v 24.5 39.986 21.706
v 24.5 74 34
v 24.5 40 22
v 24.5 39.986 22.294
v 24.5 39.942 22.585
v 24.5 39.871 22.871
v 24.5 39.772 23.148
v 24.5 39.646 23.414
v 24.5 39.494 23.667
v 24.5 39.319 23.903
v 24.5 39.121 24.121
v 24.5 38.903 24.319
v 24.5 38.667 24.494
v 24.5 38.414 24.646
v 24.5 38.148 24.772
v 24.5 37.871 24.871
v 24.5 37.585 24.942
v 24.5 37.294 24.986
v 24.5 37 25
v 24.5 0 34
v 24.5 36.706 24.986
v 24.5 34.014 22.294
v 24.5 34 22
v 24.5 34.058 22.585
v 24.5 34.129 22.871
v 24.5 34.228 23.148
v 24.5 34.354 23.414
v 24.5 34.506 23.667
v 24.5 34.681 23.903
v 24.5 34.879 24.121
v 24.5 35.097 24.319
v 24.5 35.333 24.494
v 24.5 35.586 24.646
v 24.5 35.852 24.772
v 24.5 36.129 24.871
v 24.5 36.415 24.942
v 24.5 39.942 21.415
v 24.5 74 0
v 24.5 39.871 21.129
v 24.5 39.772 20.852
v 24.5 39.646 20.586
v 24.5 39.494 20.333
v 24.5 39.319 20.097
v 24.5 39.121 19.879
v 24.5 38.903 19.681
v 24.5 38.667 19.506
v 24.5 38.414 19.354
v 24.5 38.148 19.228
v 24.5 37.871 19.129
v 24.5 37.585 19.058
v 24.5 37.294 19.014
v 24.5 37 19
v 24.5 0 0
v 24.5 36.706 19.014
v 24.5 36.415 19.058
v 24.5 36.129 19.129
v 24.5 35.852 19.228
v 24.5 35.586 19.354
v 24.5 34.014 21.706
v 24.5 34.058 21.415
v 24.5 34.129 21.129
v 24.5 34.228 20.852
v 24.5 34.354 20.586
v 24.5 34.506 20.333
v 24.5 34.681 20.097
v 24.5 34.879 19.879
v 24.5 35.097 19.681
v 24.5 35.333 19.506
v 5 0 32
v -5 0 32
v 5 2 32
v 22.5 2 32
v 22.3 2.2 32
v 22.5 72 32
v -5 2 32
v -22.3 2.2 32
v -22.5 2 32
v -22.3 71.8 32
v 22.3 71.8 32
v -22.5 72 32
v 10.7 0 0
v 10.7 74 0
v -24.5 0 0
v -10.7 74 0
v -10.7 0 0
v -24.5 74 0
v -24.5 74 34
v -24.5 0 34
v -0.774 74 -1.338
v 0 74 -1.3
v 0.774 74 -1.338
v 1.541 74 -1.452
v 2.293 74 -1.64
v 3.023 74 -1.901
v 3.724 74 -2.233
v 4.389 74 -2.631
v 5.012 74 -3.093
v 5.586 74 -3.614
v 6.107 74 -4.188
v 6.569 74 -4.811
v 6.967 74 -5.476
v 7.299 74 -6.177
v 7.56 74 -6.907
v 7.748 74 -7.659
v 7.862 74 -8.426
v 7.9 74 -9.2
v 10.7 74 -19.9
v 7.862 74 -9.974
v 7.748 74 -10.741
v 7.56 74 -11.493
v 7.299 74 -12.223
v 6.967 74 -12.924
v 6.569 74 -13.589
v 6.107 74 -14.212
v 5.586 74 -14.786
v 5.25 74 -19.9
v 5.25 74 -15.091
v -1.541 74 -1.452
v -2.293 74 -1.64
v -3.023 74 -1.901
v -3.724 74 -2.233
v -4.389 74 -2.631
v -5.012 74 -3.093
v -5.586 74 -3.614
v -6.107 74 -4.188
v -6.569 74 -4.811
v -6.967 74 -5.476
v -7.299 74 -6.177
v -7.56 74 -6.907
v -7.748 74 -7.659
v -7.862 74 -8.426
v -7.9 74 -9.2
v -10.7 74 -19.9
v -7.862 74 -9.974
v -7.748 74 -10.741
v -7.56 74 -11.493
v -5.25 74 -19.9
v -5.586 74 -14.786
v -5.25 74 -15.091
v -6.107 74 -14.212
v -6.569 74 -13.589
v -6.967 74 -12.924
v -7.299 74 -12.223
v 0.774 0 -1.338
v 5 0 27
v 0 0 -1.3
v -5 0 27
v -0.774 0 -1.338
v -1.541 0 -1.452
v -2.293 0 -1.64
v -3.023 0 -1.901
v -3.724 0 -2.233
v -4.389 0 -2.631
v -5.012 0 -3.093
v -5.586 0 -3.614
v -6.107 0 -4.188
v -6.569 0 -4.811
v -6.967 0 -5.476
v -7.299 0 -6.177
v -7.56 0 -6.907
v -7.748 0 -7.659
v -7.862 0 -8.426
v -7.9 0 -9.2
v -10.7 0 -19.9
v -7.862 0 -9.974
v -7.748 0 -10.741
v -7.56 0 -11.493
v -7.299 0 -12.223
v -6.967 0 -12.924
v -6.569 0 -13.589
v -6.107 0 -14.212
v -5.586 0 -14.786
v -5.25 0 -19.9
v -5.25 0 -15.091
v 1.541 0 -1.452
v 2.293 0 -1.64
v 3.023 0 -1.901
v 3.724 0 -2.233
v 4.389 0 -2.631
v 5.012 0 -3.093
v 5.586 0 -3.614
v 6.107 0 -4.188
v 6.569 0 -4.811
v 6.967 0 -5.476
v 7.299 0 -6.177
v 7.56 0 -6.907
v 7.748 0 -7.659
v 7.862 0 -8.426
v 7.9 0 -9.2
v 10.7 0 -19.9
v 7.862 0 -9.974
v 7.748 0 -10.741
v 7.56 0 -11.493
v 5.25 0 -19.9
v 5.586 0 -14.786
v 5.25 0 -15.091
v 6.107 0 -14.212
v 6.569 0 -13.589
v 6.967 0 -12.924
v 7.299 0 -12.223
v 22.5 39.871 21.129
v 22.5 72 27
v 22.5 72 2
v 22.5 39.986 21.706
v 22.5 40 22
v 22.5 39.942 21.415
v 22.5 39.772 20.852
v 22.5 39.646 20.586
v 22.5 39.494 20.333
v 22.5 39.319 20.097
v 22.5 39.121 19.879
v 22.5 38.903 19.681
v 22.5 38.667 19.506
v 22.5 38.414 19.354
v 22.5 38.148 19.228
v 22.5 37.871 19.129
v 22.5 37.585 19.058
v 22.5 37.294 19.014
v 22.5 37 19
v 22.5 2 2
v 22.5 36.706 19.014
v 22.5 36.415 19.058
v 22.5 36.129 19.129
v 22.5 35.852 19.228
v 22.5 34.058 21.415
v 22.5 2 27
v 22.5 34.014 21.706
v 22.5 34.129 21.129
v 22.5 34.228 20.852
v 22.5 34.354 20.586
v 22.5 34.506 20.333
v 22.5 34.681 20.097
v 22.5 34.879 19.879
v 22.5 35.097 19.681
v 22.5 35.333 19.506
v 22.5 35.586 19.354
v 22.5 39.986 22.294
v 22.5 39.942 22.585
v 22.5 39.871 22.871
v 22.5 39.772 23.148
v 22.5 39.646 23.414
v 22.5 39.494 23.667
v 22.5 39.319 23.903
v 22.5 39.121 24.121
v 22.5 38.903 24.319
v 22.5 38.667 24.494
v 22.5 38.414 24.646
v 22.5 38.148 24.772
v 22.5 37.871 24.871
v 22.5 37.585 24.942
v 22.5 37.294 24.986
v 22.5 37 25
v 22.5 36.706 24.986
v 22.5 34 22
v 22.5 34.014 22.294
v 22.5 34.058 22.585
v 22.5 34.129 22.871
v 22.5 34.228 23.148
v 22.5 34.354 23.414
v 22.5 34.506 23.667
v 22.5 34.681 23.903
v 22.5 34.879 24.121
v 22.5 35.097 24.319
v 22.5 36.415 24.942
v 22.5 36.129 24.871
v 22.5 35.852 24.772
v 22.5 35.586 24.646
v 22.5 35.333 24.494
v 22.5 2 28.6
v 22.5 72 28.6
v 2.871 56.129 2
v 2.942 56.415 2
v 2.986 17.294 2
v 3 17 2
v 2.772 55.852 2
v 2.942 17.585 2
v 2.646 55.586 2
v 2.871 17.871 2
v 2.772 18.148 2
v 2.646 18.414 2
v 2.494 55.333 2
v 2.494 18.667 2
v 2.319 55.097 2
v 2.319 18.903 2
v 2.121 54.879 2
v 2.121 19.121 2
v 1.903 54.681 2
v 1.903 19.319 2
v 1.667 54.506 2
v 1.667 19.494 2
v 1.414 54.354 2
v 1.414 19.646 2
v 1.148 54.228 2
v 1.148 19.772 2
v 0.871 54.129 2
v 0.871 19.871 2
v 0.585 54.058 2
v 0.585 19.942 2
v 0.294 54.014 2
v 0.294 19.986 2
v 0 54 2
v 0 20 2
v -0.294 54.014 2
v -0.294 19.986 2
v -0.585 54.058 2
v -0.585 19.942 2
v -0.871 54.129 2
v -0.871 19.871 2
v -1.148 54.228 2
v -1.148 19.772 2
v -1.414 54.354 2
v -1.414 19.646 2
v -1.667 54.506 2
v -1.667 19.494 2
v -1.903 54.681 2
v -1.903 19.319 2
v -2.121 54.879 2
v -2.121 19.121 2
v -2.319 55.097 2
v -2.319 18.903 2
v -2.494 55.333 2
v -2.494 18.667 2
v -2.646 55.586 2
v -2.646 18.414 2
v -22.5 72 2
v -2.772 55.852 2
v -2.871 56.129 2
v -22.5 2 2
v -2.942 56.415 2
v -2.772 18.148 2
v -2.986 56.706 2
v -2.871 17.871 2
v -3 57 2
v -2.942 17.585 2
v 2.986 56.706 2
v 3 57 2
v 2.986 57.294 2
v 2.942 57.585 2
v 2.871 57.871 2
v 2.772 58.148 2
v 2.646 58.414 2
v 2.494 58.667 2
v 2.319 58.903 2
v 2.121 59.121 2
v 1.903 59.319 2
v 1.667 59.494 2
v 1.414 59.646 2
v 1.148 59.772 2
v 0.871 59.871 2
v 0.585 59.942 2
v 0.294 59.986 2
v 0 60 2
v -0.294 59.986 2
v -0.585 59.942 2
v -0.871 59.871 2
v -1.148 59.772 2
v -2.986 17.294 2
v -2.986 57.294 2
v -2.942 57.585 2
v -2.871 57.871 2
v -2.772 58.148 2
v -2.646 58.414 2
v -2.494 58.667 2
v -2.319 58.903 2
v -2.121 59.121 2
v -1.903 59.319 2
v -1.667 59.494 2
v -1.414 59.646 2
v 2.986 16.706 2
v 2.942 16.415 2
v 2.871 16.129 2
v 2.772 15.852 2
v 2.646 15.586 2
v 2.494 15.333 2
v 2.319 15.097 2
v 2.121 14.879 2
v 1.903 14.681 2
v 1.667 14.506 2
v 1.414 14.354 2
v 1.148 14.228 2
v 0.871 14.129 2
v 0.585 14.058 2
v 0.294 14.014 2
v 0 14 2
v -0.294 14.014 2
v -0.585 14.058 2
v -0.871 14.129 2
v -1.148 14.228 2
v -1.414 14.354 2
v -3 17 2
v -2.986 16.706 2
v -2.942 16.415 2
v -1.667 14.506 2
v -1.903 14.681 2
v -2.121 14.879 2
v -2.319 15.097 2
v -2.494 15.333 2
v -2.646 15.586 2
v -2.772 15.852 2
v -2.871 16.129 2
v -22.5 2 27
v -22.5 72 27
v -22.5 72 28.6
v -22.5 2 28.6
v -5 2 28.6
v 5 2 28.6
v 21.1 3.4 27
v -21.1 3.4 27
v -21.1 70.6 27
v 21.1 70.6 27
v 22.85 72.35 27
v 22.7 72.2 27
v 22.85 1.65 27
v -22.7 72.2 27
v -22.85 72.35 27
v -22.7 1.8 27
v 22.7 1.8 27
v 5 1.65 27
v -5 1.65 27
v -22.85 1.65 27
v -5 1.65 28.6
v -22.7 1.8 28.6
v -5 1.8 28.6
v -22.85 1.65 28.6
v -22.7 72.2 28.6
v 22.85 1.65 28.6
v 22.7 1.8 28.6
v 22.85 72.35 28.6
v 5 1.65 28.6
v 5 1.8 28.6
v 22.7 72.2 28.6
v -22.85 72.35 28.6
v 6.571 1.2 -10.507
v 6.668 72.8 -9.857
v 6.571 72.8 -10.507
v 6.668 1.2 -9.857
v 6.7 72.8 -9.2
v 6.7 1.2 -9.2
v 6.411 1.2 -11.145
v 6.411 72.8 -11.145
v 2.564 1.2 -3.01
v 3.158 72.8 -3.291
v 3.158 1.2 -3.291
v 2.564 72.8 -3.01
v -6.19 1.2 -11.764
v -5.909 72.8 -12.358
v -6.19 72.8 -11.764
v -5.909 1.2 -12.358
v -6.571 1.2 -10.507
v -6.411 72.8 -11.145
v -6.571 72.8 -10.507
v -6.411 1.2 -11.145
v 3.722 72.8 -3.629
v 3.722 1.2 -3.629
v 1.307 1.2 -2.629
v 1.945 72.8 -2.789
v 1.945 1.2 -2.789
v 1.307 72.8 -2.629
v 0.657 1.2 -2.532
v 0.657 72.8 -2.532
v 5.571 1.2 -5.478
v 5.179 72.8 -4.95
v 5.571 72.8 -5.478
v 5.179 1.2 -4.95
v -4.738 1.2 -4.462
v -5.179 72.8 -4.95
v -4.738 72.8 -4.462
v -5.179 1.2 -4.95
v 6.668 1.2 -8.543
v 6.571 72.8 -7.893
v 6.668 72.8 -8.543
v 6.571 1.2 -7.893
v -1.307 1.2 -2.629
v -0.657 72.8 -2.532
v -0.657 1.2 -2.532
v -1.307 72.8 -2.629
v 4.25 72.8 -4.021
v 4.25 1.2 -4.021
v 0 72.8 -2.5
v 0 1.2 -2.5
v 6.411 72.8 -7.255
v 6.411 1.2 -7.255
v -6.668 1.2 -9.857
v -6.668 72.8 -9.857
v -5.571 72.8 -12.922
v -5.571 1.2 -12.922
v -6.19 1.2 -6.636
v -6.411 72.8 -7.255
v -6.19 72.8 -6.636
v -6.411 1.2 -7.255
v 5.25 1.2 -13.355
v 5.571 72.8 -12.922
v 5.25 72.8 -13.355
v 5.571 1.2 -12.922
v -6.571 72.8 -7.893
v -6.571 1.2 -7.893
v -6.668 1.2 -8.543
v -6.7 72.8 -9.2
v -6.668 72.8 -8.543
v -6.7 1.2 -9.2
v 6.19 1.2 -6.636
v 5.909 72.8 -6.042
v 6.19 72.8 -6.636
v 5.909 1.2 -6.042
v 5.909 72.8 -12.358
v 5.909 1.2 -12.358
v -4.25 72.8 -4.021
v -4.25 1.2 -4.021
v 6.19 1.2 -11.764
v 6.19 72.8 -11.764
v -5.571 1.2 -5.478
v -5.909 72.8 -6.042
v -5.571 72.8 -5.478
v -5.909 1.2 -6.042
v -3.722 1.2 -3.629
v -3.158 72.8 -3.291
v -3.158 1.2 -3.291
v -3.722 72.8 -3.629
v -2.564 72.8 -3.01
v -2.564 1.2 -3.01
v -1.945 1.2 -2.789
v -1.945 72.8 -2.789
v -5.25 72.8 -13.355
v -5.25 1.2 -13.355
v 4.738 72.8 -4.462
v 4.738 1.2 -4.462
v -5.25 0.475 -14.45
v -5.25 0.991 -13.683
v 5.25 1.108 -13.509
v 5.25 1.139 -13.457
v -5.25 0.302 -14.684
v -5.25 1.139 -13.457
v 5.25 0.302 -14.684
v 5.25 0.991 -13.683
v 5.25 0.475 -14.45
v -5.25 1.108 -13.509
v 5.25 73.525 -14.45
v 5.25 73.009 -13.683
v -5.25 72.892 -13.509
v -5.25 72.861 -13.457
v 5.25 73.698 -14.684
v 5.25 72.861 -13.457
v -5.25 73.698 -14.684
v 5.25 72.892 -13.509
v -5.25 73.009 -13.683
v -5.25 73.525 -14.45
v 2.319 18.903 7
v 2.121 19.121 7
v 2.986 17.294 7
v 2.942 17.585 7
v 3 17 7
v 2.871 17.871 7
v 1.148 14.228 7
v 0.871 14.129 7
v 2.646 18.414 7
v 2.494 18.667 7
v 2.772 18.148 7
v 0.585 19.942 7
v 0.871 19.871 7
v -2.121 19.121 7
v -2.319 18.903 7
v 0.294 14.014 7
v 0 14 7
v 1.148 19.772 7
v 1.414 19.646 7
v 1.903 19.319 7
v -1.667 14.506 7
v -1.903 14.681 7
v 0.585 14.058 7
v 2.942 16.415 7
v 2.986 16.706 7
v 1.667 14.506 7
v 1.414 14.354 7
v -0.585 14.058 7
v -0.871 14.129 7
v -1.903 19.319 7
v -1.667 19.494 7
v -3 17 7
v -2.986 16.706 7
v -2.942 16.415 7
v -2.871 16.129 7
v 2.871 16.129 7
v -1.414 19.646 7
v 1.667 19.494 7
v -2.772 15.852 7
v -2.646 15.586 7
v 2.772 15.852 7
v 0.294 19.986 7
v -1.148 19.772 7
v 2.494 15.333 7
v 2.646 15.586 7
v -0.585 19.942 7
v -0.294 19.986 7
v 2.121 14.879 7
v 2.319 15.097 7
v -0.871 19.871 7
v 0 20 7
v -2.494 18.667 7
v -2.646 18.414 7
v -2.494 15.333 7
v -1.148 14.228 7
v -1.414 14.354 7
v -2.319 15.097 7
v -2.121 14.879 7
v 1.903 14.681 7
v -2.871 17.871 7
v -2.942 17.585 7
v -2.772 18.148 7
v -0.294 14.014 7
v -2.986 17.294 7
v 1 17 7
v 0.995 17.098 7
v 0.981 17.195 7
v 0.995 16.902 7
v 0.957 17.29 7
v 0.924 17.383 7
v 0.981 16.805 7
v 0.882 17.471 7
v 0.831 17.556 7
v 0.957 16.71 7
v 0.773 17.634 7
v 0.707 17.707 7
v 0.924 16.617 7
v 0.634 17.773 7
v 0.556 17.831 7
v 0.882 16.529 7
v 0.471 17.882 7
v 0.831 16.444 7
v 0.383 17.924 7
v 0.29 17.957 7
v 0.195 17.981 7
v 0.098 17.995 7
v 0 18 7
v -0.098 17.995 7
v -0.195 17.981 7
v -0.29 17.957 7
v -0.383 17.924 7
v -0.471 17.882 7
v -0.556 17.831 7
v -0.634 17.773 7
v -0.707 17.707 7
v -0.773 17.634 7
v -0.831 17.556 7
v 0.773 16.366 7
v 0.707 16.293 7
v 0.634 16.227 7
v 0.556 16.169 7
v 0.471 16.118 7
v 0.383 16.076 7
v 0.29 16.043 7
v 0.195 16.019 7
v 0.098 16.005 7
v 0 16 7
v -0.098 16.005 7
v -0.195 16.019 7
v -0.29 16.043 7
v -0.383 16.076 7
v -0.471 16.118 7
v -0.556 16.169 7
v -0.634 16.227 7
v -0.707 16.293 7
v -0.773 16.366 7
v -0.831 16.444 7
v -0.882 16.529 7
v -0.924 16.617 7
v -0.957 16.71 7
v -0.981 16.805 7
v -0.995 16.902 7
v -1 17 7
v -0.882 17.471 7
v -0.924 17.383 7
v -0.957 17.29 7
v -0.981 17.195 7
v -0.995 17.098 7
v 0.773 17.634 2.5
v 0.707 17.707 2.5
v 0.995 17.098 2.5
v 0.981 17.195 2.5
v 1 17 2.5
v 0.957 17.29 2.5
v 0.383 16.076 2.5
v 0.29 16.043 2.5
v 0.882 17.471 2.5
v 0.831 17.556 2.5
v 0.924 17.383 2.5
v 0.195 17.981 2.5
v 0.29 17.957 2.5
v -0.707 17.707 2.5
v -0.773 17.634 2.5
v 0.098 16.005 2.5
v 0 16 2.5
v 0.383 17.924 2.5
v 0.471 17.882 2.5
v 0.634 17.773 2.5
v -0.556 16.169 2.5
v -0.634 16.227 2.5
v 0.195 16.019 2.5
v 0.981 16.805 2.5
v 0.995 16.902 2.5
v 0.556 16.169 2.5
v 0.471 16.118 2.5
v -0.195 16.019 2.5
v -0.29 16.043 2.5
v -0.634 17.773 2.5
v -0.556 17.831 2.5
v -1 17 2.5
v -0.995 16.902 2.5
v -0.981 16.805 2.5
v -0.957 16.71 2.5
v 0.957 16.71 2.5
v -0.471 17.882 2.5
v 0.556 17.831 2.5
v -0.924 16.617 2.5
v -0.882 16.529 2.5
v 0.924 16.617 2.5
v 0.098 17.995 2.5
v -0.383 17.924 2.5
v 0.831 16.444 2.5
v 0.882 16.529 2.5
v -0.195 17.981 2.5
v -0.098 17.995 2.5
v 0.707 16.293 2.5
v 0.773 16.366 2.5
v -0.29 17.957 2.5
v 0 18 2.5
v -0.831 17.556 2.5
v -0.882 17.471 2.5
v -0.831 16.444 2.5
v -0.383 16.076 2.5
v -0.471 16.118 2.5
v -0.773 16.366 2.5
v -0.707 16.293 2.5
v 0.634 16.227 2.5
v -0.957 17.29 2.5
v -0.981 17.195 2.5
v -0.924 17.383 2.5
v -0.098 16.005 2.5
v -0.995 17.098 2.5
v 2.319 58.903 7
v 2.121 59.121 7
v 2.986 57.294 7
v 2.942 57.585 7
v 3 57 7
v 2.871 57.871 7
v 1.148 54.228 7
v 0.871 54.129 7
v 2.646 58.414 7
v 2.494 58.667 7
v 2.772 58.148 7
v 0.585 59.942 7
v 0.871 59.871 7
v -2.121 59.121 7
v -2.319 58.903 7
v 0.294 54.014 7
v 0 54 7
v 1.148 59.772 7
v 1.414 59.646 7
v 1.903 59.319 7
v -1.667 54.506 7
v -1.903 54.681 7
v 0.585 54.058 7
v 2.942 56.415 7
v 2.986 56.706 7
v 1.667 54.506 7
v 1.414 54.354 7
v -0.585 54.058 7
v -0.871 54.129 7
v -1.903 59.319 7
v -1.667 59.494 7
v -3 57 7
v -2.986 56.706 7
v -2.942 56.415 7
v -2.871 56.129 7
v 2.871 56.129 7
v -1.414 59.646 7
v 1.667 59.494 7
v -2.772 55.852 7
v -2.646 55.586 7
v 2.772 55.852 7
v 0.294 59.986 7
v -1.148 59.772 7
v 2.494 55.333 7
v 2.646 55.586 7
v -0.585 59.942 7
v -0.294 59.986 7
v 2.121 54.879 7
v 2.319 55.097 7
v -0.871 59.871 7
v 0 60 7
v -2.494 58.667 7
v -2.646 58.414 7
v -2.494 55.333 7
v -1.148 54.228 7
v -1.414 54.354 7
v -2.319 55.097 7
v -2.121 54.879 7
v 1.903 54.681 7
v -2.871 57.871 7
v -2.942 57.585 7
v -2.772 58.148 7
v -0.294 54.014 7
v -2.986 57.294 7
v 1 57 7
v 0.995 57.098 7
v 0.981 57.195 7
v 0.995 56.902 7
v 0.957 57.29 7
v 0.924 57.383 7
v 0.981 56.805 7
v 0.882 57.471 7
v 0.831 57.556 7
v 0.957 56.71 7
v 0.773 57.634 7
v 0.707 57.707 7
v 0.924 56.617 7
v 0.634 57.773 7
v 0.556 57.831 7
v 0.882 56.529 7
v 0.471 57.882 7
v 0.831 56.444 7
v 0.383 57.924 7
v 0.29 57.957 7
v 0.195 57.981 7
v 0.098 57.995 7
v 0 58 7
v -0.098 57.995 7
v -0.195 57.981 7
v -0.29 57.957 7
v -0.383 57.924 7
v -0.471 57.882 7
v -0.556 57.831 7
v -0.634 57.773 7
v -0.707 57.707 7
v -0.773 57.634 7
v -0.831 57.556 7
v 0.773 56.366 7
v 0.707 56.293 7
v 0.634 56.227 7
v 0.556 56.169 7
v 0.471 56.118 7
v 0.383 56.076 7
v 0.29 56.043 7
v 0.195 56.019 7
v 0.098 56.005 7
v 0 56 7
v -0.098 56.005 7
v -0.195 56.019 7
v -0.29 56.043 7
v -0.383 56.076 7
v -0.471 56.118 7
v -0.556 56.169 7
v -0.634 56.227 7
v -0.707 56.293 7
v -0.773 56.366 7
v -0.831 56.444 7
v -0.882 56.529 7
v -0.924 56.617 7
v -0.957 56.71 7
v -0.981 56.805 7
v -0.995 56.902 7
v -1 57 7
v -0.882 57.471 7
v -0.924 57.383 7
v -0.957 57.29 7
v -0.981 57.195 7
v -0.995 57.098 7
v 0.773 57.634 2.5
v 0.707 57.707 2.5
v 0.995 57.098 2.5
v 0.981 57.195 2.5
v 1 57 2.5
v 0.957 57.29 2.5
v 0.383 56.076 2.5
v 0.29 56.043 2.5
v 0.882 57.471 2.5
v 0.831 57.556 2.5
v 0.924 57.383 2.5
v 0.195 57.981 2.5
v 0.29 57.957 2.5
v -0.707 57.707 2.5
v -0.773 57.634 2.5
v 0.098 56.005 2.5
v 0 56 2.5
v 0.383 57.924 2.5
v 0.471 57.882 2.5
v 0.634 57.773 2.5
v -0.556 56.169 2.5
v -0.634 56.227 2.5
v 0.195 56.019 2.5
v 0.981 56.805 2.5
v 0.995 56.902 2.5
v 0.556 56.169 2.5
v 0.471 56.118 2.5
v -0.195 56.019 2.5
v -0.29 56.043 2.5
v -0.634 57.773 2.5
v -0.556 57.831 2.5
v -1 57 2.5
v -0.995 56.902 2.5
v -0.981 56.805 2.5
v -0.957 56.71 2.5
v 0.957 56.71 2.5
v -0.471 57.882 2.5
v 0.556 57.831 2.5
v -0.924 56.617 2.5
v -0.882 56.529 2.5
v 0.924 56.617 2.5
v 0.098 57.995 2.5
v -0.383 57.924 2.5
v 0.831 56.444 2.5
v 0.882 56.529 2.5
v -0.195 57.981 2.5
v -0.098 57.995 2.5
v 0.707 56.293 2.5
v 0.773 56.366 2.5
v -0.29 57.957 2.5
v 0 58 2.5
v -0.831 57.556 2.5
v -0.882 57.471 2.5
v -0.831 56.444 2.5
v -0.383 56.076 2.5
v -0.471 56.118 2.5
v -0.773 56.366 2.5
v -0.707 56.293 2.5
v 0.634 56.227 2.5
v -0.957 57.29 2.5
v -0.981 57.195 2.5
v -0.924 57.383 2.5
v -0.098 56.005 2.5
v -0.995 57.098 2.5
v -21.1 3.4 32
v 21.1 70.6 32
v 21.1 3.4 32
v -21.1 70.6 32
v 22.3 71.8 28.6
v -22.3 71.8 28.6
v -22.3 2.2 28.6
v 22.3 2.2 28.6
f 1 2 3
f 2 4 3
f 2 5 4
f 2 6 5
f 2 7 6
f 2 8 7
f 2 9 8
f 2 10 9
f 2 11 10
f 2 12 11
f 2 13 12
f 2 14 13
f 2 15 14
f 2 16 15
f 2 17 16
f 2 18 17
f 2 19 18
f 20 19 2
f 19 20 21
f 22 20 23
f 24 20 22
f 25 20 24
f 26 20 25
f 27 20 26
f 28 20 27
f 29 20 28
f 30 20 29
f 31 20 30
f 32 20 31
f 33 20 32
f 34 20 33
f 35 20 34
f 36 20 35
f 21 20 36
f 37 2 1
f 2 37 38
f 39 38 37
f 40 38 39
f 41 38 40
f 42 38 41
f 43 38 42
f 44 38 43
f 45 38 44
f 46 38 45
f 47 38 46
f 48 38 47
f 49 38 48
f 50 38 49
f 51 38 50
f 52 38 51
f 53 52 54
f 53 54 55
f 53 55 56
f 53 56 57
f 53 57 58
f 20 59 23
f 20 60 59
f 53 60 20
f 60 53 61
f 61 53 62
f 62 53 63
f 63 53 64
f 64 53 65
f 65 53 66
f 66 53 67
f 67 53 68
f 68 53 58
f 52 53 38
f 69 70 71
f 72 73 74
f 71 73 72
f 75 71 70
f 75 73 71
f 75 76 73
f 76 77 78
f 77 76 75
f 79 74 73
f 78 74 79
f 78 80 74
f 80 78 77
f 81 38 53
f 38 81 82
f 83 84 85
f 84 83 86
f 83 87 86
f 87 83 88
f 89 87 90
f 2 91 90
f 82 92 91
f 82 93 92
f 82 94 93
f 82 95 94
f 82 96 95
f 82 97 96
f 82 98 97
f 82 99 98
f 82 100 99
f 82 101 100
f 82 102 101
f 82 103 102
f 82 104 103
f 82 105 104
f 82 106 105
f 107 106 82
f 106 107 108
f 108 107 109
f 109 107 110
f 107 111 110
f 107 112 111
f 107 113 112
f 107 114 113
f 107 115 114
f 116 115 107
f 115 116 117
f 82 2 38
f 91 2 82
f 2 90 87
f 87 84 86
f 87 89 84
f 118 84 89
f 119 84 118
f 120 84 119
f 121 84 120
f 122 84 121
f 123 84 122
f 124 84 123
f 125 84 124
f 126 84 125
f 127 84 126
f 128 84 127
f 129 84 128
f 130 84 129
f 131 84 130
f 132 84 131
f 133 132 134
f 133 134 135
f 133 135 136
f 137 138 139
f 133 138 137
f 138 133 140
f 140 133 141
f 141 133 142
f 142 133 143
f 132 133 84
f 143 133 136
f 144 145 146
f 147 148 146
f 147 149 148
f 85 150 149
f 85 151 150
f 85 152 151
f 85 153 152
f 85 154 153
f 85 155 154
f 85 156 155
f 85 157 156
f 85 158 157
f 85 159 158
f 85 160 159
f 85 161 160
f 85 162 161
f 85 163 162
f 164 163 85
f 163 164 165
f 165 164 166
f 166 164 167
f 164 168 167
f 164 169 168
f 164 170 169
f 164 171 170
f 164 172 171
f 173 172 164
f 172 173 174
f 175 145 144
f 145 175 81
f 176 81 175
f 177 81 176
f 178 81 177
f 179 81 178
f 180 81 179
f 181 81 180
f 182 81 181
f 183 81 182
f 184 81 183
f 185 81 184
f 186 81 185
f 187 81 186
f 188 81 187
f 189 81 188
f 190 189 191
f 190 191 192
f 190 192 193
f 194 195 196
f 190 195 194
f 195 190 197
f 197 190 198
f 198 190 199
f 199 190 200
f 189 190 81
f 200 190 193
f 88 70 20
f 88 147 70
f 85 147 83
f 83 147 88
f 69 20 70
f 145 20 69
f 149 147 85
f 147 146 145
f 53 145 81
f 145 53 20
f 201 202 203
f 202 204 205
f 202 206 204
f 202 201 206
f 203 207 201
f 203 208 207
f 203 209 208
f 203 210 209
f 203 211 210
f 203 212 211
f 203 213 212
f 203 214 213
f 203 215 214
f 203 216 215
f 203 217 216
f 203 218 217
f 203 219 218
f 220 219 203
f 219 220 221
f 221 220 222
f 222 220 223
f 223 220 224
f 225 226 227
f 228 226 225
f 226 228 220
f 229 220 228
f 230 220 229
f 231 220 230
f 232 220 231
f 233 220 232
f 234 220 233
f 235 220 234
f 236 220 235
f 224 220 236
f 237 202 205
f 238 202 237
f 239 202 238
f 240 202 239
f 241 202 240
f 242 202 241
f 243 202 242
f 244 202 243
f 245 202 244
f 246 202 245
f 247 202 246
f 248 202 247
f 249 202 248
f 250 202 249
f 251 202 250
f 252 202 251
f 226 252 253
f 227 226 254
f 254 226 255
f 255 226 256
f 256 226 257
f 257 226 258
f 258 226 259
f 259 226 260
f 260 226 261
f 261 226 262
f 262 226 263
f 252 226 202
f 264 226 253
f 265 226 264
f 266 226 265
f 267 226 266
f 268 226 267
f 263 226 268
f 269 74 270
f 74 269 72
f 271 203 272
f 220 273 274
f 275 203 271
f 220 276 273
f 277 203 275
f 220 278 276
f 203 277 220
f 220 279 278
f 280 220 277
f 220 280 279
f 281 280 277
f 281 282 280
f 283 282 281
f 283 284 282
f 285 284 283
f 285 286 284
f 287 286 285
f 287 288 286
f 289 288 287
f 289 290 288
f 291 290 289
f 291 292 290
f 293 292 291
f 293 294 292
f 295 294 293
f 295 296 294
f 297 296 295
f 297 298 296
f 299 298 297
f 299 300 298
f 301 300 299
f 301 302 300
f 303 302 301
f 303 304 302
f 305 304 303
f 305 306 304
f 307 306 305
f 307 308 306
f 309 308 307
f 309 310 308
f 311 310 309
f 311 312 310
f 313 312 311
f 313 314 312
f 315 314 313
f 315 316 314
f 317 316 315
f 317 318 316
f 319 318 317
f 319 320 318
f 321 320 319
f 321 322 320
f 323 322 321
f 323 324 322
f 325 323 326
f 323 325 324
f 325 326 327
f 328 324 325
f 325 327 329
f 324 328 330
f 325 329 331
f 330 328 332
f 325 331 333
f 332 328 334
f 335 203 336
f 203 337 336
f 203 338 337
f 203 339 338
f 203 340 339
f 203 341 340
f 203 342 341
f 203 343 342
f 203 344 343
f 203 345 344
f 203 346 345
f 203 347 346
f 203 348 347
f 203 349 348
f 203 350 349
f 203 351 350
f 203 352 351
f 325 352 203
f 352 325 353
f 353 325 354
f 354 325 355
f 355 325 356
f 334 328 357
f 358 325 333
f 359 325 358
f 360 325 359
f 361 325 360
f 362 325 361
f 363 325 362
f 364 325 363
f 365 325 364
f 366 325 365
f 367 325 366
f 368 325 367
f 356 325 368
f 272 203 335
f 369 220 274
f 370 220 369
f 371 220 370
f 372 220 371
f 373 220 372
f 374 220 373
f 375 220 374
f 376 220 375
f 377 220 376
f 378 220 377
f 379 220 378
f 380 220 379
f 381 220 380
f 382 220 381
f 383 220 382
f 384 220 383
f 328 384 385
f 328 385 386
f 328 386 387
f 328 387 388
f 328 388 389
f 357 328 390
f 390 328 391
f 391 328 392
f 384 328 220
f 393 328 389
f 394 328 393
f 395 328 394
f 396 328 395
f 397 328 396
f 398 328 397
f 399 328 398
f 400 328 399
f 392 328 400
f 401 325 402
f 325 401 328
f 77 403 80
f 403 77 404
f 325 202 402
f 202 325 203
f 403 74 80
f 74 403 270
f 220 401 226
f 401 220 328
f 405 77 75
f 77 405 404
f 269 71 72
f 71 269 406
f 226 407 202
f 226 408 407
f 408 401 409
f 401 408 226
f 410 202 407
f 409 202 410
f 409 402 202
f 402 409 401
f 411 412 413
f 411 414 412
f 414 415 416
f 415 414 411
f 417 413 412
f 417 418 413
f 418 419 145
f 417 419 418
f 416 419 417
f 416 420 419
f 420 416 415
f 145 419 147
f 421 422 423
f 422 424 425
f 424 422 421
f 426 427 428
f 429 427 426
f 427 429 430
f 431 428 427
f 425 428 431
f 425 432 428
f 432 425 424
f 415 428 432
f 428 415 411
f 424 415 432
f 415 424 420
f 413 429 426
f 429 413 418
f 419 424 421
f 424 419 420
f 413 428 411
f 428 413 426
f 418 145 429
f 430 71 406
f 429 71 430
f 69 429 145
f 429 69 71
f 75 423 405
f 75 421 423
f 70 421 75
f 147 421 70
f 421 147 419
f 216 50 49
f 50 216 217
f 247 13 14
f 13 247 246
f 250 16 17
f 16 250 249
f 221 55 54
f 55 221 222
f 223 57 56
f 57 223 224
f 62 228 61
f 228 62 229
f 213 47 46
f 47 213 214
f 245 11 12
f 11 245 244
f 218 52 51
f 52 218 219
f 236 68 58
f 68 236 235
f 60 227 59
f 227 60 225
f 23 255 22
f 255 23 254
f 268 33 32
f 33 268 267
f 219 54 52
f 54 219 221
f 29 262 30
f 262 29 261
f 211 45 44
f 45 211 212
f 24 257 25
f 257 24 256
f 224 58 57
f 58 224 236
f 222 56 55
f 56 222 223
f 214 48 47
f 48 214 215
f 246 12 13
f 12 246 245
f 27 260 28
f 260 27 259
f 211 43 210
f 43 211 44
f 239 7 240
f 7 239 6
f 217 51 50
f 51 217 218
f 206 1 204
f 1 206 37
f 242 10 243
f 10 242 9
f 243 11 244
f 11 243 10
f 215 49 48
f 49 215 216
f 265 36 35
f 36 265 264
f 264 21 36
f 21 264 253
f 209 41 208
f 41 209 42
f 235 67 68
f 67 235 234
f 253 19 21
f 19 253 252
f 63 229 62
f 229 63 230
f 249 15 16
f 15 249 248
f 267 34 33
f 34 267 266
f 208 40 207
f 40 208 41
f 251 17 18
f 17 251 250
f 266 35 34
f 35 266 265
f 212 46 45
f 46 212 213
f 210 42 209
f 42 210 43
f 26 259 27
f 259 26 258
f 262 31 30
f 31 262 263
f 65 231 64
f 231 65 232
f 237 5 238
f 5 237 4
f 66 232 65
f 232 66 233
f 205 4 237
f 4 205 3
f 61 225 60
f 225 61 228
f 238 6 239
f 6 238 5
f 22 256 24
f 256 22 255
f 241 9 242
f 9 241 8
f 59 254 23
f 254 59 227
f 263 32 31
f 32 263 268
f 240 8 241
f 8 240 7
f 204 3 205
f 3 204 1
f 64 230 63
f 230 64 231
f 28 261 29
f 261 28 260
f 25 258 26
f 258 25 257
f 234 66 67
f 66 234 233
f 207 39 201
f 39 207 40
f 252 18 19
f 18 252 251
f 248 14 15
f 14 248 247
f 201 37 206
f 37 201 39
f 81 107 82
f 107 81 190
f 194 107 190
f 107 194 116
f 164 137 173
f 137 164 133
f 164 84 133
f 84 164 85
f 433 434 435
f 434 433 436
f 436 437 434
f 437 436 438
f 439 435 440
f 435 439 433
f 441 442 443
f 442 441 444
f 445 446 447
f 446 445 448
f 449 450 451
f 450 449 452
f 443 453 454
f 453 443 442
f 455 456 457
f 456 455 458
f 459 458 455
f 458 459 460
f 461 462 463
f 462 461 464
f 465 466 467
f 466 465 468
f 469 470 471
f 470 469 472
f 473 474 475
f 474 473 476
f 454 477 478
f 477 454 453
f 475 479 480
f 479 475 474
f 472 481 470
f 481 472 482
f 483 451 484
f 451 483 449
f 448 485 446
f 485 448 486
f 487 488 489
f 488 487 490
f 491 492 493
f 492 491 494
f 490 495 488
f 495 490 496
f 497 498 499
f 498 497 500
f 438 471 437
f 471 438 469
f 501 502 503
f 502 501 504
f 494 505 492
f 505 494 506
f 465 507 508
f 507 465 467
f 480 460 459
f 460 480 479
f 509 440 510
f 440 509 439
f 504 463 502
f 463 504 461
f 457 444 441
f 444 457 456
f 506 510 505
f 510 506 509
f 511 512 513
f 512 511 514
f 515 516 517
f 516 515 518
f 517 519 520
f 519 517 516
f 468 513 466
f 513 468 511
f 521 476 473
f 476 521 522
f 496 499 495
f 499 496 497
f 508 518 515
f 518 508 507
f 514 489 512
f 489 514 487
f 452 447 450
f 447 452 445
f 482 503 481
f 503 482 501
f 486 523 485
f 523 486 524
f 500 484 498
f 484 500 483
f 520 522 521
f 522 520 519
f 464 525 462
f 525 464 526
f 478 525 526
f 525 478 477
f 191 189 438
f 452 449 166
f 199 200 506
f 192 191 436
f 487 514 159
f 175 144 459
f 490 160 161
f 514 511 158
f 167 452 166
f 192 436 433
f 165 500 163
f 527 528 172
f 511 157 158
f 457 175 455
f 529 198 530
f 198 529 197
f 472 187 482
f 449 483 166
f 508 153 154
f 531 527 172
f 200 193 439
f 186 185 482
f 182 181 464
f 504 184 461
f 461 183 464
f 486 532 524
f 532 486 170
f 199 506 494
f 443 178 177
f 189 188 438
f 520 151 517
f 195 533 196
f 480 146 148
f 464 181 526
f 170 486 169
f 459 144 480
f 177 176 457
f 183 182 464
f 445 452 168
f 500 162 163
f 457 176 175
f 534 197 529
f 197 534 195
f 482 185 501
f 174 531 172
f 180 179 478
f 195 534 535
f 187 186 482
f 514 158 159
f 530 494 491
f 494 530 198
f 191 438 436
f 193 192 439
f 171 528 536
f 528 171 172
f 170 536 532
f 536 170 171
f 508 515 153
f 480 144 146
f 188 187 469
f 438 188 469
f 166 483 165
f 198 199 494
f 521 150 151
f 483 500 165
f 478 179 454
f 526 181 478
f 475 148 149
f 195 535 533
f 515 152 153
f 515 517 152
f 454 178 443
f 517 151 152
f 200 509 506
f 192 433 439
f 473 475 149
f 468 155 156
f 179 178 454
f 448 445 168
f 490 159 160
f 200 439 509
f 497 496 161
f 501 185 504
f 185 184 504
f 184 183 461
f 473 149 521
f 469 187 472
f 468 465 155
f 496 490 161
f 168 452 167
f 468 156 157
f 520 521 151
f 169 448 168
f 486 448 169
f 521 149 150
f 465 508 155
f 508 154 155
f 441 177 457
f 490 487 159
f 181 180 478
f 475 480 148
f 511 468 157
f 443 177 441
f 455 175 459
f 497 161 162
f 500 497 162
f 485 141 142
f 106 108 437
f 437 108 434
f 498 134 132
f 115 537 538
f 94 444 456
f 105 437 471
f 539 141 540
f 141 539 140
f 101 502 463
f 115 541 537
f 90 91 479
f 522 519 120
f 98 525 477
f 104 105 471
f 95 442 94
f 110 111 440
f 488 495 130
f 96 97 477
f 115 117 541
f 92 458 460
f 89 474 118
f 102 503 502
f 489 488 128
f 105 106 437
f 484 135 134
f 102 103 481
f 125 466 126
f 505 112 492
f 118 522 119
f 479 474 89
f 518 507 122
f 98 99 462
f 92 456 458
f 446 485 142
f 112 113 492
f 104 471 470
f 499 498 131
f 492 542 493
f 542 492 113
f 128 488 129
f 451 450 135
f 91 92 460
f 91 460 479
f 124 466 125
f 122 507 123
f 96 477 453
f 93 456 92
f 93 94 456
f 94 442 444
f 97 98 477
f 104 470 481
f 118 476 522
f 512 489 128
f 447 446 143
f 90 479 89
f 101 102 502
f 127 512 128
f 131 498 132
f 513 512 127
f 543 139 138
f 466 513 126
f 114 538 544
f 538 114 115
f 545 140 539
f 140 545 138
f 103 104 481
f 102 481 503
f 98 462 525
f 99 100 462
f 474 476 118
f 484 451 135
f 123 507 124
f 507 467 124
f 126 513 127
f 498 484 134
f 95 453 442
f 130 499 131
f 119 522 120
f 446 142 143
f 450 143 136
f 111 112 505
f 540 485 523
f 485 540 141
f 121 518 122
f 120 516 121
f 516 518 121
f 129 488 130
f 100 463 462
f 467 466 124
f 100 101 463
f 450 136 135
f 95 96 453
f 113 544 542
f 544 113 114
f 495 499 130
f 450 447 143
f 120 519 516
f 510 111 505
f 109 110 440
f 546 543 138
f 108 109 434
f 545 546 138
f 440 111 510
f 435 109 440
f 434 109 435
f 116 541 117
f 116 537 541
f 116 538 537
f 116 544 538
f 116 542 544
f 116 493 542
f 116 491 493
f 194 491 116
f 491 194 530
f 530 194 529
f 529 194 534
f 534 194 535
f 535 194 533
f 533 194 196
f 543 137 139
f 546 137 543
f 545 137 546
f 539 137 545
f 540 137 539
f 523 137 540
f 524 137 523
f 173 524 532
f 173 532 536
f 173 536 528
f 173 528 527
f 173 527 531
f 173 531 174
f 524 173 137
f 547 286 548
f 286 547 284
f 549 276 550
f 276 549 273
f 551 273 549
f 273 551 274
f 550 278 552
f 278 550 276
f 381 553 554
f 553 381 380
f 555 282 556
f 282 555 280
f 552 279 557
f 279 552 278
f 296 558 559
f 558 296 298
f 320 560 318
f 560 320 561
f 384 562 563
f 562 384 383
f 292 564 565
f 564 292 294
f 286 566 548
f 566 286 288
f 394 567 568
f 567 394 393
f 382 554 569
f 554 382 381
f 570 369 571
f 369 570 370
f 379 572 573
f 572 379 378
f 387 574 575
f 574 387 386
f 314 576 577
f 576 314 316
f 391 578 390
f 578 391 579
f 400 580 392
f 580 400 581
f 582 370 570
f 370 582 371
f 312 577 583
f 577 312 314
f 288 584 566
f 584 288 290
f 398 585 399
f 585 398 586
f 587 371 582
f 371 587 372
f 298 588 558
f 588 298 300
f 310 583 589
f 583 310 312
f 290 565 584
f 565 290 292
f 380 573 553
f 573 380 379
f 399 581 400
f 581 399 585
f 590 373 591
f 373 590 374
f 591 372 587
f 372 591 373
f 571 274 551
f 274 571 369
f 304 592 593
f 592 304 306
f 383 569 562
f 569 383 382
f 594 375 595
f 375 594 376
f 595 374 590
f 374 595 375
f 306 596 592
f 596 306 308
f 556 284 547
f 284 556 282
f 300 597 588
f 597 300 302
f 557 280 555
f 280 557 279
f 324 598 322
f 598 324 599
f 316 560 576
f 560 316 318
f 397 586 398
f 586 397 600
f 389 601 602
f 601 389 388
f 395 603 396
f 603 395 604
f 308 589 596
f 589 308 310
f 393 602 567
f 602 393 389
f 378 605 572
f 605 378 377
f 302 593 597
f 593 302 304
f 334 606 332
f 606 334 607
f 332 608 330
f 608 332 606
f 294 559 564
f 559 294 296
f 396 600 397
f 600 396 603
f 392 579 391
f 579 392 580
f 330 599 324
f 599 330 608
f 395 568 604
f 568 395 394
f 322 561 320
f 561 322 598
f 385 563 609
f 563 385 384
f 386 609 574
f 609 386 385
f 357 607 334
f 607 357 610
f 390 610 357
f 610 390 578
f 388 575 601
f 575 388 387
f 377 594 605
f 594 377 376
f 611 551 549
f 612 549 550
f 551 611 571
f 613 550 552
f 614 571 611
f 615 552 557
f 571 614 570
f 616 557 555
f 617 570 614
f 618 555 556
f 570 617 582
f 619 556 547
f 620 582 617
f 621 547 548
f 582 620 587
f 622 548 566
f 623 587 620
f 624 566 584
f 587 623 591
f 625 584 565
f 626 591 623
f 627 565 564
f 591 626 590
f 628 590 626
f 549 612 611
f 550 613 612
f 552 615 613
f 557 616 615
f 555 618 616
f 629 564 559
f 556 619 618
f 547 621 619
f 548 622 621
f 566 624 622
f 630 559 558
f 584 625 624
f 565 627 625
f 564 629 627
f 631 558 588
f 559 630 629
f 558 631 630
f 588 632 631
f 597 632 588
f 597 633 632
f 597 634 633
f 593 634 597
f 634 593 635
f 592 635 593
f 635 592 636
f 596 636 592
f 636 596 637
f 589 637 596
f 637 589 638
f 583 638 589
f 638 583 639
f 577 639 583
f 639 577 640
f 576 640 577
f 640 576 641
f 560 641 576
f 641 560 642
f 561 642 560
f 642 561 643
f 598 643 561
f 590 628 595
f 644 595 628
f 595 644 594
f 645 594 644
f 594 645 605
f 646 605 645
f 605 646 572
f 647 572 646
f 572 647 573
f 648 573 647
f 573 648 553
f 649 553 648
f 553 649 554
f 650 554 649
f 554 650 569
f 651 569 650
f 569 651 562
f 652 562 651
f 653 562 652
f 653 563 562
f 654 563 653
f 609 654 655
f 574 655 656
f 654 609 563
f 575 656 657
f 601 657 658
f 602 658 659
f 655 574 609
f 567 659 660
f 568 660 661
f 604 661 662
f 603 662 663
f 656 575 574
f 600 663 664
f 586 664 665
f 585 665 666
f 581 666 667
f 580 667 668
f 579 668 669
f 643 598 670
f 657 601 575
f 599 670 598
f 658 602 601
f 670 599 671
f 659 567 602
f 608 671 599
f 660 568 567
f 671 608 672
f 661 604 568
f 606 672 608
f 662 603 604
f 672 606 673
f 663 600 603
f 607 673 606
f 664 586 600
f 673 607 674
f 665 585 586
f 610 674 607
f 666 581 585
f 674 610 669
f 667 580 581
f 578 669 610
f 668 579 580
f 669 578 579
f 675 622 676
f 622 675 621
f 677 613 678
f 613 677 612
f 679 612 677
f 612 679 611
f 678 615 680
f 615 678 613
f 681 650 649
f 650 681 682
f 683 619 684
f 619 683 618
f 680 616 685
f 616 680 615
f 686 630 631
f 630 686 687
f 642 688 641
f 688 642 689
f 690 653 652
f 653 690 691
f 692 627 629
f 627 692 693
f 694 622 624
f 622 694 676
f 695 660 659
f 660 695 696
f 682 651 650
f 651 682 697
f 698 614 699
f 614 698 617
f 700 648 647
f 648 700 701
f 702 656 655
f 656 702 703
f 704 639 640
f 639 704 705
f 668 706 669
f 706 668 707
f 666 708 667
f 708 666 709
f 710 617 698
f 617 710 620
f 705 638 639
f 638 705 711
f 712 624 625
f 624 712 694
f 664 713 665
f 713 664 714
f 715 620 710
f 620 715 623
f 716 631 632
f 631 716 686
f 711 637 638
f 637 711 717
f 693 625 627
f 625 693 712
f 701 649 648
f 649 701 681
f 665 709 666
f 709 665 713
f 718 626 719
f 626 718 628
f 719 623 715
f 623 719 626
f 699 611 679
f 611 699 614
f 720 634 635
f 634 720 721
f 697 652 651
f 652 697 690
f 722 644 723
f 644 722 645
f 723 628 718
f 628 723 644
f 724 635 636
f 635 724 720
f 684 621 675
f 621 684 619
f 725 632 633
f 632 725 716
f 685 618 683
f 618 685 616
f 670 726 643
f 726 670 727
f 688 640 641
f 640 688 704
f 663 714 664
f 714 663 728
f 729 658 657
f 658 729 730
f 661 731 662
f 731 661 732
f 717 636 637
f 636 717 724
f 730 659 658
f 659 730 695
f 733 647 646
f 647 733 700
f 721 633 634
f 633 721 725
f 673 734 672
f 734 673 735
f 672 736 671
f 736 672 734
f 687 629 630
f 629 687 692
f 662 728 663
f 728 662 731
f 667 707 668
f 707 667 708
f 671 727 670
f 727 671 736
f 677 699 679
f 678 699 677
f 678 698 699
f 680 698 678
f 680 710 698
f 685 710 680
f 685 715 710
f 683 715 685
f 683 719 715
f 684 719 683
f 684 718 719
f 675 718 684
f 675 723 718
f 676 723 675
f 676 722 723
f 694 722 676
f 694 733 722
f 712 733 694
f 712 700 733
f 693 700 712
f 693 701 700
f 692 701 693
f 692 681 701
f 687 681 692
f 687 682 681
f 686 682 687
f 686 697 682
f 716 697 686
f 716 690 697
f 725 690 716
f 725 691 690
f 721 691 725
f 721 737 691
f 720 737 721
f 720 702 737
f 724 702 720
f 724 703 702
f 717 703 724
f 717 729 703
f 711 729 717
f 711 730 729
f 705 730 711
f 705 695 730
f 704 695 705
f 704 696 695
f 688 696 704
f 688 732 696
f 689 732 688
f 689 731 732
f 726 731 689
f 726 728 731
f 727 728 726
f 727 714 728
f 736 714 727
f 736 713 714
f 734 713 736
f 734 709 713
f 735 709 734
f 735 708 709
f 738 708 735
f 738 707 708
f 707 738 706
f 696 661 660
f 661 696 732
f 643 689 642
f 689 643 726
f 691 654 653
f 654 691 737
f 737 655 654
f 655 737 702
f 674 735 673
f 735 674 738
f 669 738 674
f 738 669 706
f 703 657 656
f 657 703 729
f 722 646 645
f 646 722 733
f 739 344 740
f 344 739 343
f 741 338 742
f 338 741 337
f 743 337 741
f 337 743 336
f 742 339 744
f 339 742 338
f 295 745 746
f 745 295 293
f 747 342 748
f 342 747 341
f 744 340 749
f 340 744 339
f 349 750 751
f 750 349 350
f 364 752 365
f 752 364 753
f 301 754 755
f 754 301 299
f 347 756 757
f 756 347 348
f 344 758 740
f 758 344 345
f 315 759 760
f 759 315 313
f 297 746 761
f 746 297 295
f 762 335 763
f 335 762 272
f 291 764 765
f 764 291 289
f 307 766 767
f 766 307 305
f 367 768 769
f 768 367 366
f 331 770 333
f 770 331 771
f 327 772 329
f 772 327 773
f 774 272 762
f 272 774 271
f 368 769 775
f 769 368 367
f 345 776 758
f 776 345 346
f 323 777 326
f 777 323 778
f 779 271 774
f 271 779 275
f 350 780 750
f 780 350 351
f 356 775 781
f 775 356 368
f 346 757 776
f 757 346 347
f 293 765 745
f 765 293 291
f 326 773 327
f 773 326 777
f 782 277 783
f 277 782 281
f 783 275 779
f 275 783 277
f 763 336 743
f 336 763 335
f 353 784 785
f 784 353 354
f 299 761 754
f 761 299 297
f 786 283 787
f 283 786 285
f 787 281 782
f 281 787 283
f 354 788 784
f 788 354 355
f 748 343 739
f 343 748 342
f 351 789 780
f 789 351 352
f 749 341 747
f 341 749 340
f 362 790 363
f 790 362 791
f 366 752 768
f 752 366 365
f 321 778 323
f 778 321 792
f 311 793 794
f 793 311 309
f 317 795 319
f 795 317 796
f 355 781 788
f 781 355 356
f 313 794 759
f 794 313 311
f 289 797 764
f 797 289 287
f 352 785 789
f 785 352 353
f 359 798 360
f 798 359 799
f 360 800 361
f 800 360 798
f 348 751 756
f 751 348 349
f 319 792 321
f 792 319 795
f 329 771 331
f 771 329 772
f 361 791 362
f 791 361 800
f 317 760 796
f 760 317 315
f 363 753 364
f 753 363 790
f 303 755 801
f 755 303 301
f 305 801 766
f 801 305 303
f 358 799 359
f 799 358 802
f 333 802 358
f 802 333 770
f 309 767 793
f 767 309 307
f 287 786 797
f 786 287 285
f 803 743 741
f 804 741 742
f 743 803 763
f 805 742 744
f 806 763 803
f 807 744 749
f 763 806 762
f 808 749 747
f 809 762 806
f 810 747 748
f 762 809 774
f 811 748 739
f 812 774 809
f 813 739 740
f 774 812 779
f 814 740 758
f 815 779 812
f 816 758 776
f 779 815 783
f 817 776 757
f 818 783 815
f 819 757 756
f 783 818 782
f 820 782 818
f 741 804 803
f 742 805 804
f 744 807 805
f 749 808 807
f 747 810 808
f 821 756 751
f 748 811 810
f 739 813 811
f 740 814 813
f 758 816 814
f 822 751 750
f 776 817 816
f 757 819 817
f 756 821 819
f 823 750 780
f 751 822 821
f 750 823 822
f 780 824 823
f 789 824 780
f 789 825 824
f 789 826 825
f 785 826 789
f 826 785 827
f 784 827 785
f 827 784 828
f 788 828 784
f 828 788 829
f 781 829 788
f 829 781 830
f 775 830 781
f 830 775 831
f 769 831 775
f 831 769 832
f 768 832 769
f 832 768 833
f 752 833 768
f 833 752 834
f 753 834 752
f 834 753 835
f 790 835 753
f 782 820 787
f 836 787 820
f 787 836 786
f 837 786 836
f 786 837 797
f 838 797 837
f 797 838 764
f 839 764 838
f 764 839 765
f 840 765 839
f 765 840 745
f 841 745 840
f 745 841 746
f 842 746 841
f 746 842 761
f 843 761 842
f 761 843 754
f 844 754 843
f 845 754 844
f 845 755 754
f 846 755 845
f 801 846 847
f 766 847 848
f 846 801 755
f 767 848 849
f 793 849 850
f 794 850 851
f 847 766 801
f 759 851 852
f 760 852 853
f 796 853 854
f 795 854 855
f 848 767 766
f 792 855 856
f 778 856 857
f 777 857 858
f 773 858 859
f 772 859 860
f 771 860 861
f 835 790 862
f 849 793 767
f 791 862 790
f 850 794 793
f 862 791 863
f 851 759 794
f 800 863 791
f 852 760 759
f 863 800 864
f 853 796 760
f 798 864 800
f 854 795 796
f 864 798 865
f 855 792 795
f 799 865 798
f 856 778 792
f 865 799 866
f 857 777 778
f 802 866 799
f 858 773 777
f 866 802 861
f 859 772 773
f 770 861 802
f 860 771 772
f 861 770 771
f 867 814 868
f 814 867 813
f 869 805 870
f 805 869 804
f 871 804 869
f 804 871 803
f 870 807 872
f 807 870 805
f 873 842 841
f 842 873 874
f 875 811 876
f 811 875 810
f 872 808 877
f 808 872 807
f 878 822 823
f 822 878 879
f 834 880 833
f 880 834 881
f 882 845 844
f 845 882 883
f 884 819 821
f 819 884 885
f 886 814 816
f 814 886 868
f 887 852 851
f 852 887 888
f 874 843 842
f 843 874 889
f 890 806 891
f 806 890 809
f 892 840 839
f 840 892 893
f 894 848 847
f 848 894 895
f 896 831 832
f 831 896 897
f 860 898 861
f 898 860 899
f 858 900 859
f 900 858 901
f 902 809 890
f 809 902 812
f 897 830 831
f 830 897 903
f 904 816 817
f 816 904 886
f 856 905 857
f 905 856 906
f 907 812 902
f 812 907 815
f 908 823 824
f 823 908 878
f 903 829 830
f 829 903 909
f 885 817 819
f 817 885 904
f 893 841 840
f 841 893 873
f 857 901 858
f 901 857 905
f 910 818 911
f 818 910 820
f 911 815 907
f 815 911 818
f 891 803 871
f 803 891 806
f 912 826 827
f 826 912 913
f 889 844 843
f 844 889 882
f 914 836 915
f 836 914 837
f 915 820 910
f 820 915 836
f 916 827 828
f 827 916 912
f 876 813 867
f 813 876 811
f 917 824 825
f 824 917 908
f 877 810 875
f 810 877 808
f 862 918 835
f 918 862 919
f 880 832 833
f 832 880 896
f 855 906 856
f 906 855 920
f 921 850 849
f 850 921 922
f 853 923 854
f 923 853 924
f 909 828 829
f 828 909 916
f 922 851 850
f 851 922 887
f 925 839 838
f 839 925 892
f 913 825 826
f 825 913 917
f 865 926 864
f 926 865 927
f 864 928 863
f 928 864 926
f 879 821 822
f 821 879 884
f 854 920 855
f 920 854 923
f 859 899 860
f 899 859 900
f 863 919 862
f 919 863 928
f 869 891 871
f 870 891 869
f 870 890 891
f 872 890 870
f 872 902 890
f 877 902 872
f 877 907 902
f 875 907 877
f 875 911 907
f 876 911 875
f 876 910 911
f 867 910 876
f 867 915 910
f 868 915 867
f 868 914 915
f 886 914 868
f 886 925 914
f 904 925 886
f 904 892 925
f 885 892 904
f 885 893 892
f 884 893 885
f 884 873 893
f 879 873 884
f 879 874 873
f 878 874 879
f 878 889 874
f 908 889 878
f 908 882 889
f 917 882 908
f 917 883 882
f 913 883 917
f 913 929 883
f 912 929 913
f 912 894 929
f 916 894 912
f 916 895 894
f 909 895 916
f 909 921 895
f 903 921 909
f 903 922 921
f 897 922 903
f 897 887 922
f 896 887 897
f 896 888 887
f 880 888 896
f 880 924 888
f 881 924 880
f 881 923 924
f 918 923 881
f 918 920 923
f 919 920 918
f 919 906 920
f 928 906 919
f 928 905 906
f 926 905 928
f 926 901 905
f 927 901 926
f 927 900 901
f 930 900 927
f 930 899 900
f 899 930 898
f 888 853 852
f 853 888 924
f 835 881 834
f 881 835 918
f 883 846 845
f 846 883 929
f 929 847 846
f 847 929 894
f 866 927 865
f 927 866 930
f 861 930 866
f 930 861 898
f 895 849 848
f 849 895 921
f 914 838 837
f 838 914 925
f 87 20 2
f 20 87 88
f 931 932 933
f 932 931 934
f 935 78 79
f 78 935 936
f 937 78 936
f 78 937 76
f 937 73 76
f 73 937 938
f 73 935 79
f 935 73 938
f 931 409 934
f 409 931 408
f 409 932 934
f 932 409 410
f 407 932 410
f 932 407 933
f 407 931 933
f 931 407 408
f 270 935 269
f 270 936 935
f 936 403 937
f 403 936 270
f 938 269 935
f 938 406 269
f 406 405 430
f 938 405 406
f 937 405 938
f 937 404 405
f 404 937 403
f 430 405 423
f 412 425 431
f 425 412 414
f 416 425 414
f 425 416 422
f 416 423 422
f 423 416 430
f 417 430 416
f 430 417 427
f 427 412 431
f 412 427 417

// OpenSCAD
// Swing Monitor - shaft-mount enclosure
// Parametric OpenSCAD model driven by hardware/encloser.md
//
// Design (see chat / README for full rationale):
//  - Two-piece shell: "base" (5 closed sides, open top) + flat "lid"
//    that snaps into the open top via a thin flexible lip with a
//    perimeter bead, which pops into a matching groove in the cavity
//    wall - same thin-wall-interference idea as the shaft clip below,
//    just applied as a rectangular loop instead of a circular one.
//  - A pry notch is cut into one end of the base's rim so there's
//    somewhere to get a fingernail/thin tool under the lid to release
//    the bead and lift it off (it clicks shut positively, so a flush
//    friction-only seam would be very hard to open).
//  - A solid rectangular ring is fused to the underside of the base,
//    bored through with a circular hole for the shaft plus a straight
//    capture slot connecting the bore to the outside (gap facing
//    down). It's installed by clipping it sideways onto the shaft at
//    a point where the shaft is already narrower than the slot (no
//    flexing needed to get it on), then sliding it up the taper until
//    the bore wedges tight at the 13mm mounting point. Because the
//    slot width sits between "narrow enough to clip on" and "too
//    narrow to slip back off at 13mm", it self-retains without ever
//    needing to flex - so the ring can be fully rigid.
//    (v1 used a thin C-clip that snapped on radially by flexing open
//    over the full 13mm - it cracked in testing: PLA has very low
//    elongation at break, and the clip also put a sharp stress-riser
//    right at the weakest print-adhesion seam. v2 tried a fully closed
//    sliding sleeve, but that can't get past a fixed/epoxied clubhead.
//    This version avoids both problems - no flex, and installs without
//    removing the head.)
//  - slot_w = 10.5mm: measured shaft diameter at the clip-on point is
//    ~9mm, so this gives ~1.5mm clearance to clip on without force
//    (also covers FDM holes typically printing a touch undersized),
//    while staying 2.5mm under shaft_d (13mm) so the ring can't slip
//    sideways back off once slid up to the mount point. If the fit
//    feels wrong either way after printing, it's a one-line tweak.
//  - Case Y axis runs parallel to the shaft (per encloser.md: "Y axis
//    of the PCB should point up the shaft").
//
// Assumptions made beyond encloser.md (flagged in chat - revisit after
// a test fit):
//  - encloser.md's PCB+battery box (45 x 70 x 30) is treated as the
//    required INTERNAL cavity, not an outer envelope.
//  - 2mm shell walls, 1.2mm lid-lip walls (thin enough to flex for a
//    PLA snap-fit - the lid still relies on flexing, unlike the sleeve).
//  - Sleeve bore is sized shaft_d + slide_clearance for an easy slide
//    fit; nothing here guarantees it stops/grips exactly at the 13mm
//    point without knowing the real taper profile, so plan on a wrap
//    of grip tape over the sleeve's top edge (traps it from sliding
//    further up) and/or a dab of glue for final retention.
//  - PCB (veroboard, screwed through a flange) sits on two 5mm-tall
//    bosses with blind M2.5 self-tap pilot holes rather than one
//    continuous ledge - same holding strength for a 2-point mount,
//    less material/print time. boss_pos below is a PLACEHOLDER
//    (centered in X, guessed spacing in Y) - it has not been checked
//    against your actual flange hole positions, update it to match
//    before printing for real.
//  - Bead/groove sizes on the lid are a first-pass guess at PLA's
//    flex - print and test; loosen (reduce bead_h) if it's too tight
//    to open, tighten if it doesn't hold.

$fn = 64;

// ---- tunable parameters ----
shaft_d      = 13;    // shaft diameter at the mount point (mm)
box_x        = 45;    // internal cavity width  (X)
box_y        = 70;    // internal cavity length (Y) - parallel to shaft
box_z        = 30;    // internal cavity height (Z)
wall         = 2;     // shell wall thickness (mm)
slide_clear  = 0.4;   // sleeve bore clearance over shaft_d, for sliding on (mm)
sleeve_wall  = 4;     // sleeve wall thickness - rigid, no flex needed (mm)
sleeve_chamfer = 1.2; // lead-in chamfer at the sleeve's ends (mm)
sleeve_overlap = 1.5; // how far the sleeve's top face sits inside the
                       // base's bottom slab (0..wall), for a solid weld
slot_w       = 10.5;  // capture-slot width (mm) - see note above:
                       // shaft-diameter-at-clip-on-point < slot_w < shaft_d
lip_h        = 5;     // lid lip depth (mm)
lip_wall     = 1.2;   // lid lip wall thickness (thin, so it can flex)
lid_clear    = 0.2;   // nominal lid-to-cavity fit clearance per side (mm)
bead_h       = 0.4;   // snap-bead radial projection beyond the lip (mm)
bead_band    = 1.6;   // height of the bead / matching groove band (mm)
groove_clear = 0.15;  // extra clearance in the groove vs the bead (mm)
notch_w      = 10;    // pry-notch width, cut into the rim at y=0 (mm)
notch_d      = 5;     // pry-notch depth, down from the rim (mm)
boss_h       = 5;     // PCB standoff boss height, off the cavity floor (mm)
boss_od      = 6;     // boss outer diameter (mm)
pilot_d      = 2.0;   // pilot hole diameter for a self-tapping M2.5 (mm)
pilot_depth  = 4.5;   // blind pilot hole depth from the boss top (mm)
// PLACEHOLDER positions (x, y) in cavity-local coords: x=0 is the
// cavity centreline, y=0..box_y runs the cavity's length - MUST be
// updated to match your veroboard flange's real hole spacing
boss_pos     = [[0, 15], [0, 55]];

// on/off switch hole - straight through-hole in the +X long wall,
// for a panel-mount toggle/rocker switch (6mm is a common bushing
// size for these - check it matches whatever switch you buy, and
// that its bushing is rated for a ~2mm panel, i.e. the wall thickness)
hole_d       = 6;     // hole diameter (mm)
hole_below_lip = 5;   // "5mm lower than the ledge for the lid" - measured
                       // from the BOTTOM of the lid's lip (z = box_z+wall-lip_h),
                       // not the rim itself, since the rim sits right in the
                       // snap-groove band and a hole there would weaken it

// ---- derived ----
out_x      = box_x + 2*wall;
out_y      = box_y + 2*wall;
sleeve_id  = shaft_d + slide_clear;
sleeve_od  = sleeve_id + 2*sleeve_wall;
lip_ox     = box_x - 2*lid_clear;               // lip outer footprint
lip_oy     = box_y - 2*lid_clear;
lip_ix     = lip_ox - 2*lip_wall;                // lip inner (hollow) footprint
lip_iy     = lip_oy - 2*lip_wall;
groove_x   = lip_ox + 2*bead_h + 2*groove_clear; // groove cut footprint
groove_y   = lip_oy + 2*bead_h + 2*groove_clear;

module shaft_sleeve() {
    // rigid block: circular bore for the shaft, plus a straight
    // capture slot (constant width slot_w) connecting the bore to the
    // outside at the bottom, so the shaft clips in sideways rather
    // than needing to be threaded through an end
    z_center = sleeve_overlap - sleeve_od/2;
    translate([0, 0, z_center]) {
        difference() {
            translate([-sleeve_od/2, 0, -sleeve_od/2])
                cube([sleeve_od, out_y, sleeve_od]);
            rotate([-90, 0, 0])
                cylinder(d = sleeve_id, h = out_y + 2, center = false);
            // lead-in chamfers at both ends so it doesn't catch/scrape
            // as it's slid up the shaft's taper, either way round
            rotate([-90, 0, 0])
                cylinder(d1 = sleeve_id + 2*sleeve_chamfer, d2 = sleeve_id,
                         h = sleeve_chamfer);
            translate([0, out_y - sleeve_chamfer, 0])
                rotate([-90, 0, 0])
                    cylinder(d1 = sleeve_id, d2 = sleeve_id + 2*sleeve_chamfer,
                             h = sleeve_chamfer);
            // capture slot - straight channel from the bore's centre
            // (local z=0) down through the block's bottom face
            translate([-slot_w/2, -1, -sleeve_od/2 - 1])
                cube([slot_w, out_y + 2, sleeve_od/2 + 1]);
        }
    }
}

module groove_2d() {
    difference() {
        square([groove_x, groove_y], center = true);
        square([box_x, box_y], center = true);
    }
}

module pry_notch() {
    // through the y=0 end wall, from the rim down by notch_d
    translate([-notch_w/2, -1, box_z + wall - notch_d])
        cube([notch_w, wall + 2, notch_d + 1]);
}

module side_hole() {
    // on/off switch, panel-mounted through the +X long wall, centered
    // along the case length
    hole_z = (box_z + wall - lip_h) - hole_below_lip;
    translate([out_x/2 - wall - 2, wall + box_y/2, hole_z])
        rotate([0, 90, 0])
            cylinder(d = hole_d, h = wall + 4);
}

module base_shell() {
    difference() {
        translate([-out_x/2, 0, 0])
            cube([out_x, out_y, box_z + wall]);
        translate([-box_x/2, wall, wall])
            cube([box_x, box_y, box_z + 1]); // open top
        // groove that the lid's snap-bead pops into once fully seated
        translate([0, wall + box_y/2, wall + box_z - lip_h])
            linear_extrude(height = bead_band)
                groove_2d();
        pry_notch();
        side_hole();
    }
}

module pcb_boss(pos) {
    // solid pillar off the cavity floor with a blind pilot hole from
    // the top - screw drives down through the veroboard flange into it
    translate([pos[0], wall + pos[1], wall])
        difference() {
            cylinder(d = boss_od, h = boss_h);
            translate([0, 0, boss_h - pilot_depth])
                cylinder(d = pilot_d, h = pilot_depth + 1);
        }
}

module pcb_bosses() {
    for (p = boss_pos) pcb_boss(p);
}

module base() {
    union() {
        base_shell();
        shaft_sleeve();
        pcb_bosses();
    }
}

module lip_ring(ox, oy, ix, iy, h) {
    linear_extrude(height = h)
        difference() {
            square([ox, oy], center = true);
            square([ix, iy], center = true);
        }
}

module lid() {
    union() {
        // flat cap - matches the base's outer footprint, rests on the rim
        translate([-out_x/2, 0, 0])
            cube([out_x, out_y, wall]);
        // thin flexible lip - centered on the cavity, drops down into it
        translate([0, wall + box_y/2, -lip_h])
            lip_ring(lip_ox, lip_oy, lip_ix, lip_iy, lip_h);
        // snap bead at the tip (leading edge on insertion) - pops into
        // the base's groove once the lid is fully seated
        translate([0, wall + box_y/2, -lip_h])
            lip_ring(lip_ox + 2*bead_h, lip_oy + 2*bead_h, lip_ix, lip_iy, bead_band);
    }
}

// lid re-oriented flat-side-down for support-free printing
// (its "assembled" pose above has the lip hanging below the cap)
module lid_print_ready() {
    translate([0, 0, wall])
        mirror([0, 0, 1])
            lid();
}

module assembled_preview() {
    color("SteelBlue") base();
    translate([0, 0, box_z + wall])
        color("Orange", 0.9) lid();
}

// ---- render selection ----
// part = "assembled" | "base" | "lid"
part = "assembled";

if (part == "assembled") assembled_preview();
else if (part == "base") base();
else if (part == "lid") lid_print_ready();
